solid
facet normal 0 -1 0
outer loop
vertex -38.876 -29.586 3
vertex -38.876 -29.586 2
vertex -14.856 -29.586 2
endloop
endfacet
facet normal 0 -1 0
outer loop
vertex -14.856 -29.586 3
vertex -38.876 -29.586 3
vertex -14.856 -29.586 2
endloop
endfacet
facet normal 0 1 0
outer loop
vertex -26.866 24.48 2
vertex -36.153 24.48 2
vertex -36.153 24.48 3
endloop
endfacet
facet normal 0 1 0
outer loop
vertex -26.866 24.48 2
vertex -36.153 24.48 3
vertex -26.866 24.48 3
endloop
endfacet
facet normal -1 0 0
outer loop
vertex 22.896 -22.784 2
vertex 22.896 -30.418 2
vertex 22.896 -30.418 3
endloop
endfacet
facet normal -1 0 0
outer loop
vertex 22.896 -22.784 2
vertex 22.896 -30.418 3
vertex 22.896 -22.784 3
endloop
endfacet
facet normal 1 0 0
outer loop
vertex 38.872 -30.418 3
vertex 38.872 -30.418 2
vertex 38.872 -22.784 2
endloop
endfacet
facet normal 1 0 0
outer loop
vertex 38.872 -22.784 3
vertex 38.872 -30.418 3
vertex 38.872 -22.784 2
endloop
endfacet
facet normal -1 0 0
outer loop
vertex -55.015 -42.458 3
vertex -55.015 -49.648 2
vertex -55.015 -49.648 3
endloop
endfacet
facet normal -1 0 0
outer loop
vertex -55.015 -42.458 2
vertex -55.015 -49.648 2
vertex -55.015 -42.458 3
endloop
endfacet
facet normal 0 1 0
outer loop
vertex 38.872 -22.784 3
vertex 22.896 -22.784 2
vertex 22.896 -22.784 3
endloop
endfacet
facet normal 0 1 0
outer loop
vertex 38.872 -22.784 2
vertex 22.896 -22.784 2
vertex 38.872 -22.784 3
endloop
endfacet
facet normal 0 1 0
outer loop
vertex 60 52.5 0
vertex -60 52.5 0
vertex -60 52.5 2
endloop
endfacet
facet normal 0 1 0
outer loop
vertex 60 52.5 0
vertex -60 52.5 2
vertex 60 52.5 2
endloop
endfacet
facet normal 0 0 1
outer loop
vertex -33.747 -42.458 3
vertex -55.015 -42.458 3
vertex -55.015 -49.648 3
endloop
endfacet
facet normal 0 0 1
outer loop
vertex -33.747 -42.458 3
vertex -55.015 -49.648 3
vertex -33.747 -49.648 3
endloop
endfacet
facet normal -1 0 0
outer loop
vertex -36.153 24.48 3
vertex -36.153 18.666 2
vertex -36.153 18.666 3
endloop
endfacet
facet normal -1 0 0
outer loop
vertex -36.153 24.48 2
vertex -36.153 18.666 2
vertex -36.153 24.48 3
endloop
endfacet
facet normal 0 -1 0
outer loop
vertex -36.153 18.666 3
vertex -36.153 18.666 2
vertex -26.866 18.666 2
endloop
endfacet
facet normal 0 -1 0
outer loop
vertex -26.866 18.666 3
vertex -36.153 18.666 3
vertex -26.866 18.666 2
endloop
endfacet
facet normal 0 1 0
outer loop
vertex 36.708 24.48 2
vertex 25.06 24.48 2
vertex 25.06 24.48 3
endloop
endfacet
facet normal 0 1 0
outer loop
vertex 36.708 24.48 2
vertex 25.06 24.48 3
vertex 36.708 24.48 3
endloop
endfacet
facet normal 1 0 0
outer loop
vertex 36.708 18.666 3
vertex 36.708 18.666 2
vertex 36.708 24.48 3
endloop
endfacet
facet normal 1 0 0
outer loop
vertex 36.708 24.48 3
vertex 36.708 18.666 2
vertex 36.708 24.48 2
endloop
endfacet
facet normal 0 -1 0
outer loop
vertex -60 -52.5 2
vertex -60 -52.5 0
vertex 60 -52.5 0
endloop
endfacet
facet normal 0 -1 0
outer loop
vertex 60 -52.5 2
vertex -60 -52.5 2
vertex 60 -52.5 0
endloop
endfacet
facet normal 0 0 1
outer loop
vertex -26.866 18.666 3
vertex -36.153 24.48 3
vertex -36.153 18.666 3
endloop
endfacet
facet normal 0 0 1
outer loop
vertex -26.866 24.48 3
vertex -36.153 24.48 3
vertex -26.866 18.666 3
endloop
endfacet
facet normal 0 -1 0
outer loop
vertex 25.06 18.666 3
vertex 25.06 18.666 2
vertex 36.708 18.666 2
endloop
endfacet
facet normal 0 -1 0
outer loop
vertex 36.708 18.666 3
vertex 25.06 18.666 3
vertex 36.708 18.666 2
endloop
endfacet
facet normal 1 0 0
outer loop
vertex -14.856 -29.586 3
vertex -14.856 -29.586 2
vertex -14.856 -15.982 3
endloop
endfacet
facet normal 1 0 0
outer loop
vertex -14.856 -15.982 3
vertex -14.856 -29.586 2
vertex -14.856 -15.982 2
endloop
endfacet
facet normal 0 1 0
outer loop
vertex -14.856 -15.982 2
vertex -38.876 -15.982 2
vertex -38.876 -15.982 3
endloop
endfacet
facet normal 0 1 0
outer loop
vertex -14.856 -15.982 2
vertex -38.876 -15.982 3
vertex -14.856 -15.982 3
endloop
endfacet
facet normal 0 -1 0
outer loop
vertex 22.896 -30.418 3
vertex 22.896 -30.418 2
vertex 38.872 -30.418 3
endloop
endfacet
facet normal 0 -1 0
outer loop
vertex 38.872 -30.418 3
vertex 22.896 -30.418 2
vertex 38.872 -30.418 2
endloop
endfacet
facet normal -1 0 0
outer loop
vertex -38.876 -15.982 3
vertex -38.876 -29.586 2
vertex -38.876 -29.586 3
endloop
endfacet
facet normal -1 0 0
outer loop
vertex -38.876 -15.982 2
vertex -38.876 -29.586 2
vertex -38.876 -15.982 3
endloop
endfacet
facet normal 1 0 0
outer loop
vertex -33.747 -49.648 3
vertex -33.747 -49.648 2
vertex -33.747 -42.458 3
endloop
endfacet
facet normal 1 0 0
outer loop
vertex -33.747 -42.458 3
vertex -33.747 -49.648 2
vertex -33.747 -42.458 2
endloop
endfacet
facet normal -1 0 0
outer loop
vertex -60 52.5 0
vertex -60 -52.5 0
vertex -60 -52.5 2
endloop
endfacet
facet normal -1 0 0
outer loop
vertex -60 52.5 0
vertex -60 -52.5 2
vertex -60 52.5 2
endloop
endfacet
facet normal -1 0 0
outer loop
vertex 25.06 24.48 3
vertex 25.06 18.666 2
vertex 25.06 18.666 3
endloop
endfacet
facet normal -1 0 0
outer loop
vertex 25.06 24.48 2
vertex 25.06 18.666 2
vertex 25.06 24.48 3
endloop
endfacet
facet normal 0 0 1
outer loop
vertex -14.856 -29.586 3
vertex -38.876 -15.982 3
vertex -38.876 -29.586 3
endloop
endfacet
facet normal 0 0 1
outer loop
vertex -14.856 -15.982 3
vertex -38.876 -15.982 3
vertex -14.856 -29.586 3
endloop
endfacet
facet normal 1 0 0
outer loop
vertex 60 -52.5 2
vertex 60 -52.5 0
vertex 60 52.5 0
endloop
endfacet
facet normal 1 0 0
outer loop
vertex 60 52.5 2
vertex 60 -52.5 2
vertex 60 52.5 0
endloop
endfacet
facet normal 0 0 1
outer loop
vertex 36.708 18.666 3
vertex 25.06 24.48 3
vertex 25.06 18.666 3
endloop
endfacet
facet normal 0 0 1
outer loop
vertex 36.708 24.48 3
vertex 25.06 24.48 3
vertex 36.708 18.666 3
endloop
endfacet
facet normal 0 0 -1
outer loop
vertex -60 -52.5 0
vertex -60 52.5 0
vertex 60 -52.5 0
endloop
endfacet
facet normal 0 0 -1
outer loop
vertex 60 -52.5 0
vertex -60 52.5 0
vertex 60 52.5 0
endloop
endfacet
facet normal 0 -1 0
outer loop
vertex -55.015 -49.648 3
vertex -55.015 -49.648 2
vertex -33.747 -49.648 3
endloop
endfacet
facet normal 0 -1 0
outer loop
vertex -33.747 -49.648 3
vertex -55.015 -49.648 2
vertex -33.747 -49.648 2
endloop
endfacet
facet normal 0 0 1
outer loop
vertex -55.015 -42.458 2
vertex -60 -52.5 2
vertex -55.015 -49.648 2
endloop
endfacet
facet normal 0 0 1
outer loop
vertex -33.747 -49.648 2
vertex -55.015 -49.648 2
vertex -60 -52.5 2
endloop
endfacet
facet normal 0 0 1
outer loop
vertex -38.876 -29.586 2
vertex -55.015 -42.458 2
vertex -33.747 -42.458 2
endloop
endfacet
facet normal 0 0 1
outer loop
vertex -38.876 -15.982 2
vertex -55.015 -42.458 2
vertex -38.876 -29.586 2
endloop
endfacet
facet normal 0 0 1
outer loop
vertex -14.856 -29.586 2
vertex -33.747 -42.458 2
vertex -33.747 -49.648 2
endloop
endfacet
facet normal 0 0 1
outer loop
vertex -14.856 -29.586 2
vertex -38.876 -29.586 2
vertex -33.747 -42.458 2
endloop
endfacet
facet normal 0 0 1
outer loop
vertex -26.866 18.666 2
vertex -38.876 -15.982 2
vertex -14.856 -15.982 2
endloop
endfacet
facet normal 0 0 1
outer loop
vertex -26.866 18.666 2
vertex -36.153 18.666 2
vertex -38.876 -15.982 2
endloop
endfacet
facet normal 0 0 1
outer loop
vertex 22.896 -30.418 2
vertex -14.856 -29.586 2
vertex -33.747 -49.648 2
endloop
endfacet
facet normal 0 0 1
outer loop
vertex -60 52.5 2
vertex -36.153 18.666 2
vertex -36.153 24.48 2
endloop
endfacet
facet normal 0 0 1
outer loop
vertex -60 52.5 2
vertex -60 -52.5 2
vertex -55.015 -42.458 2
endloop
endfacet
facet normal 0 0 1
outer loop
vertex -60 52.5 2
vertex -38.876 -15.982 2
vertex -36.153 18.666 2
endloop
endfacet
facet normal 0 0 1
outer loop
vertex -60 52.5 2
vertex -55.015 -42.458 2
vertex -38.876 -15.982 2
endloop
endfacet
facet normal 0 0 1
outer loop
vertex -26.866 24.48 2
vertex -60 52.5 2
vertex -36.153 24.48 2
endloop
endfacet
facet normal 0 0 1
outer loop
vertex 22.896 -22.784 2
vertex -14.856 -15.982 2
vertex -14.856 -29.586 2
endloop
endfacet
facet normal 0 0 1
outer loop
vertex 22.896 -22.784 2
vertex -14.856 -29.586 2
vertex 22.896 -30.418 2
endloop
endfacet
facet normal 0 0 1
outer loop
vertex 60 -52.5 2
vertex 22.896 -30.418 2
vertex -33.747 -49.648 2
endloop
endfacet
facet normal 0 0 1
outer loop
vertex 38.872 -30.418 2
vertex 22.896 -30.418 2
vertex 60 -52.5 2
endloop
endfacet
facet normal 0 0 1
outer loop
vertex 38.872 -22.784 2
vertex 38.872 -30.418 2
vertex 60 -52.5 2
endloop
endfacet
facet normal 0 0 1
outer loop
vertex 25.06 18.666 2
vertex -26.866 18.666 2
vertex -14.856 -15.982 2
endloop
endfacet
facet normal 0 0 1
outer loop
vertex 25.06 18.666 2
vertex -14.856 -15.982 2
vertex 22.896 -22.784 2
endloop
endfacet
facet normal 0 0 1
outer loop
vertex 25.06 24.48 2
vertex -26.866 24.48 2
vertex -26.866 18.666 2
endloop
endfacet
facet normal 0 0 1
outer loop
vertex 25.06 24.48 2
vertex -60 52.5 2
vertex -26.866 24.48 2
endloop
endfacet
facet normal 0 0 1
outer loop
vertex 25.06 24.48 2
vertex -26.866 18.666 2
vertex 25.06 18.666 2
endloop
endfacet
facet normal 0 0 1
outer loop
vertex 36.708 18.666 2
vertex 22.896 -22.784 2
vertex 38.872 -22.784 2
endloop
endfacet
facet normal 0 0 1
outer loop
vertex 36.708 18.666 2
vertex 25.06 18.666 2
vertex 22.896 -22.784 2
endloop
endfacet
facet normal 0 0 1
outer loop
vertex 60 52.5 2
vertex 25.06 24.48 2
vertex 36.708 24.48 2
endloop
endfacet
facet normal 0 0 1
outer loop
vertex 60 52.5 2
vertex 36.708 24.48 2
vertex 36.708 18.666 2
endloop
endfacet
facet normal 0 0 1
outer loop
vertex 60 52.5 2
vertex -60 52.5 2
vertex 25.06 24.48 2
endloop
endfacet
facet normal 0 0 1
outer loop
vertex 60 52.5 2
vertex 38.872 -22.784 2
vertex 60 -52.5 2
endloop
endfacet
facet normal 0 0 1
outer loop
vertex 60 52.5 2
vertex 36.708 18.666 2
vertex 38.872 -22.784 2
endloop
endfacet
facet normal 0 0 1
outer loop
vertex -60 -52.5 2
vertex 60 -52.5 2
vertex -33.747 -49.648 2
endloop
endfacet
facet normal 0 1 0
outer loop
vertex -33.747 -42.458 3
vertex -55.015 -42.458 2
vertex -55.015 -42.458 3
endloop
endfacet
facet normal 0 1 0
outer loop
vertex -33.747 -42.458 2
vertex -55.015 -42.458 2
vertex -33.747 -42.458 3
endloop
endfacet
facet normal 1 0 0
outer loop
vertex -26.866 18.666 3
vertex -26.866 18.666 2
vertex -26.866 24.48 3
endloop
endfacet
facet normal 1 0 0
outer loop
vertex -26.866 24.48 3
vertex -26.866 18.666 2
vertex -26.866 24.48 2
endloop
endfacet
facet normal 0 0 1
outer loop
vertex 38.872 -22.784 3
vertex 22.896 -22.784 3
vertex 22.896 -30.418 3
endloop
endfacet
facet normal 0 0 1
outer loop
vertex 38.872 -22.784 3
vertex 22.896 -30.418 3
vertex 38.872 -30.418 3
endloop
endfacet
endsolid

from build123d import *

# Parameters (mm, degrees)
SKETCH1_W           = 120
SKETCH1_H           = 105
BOSS_EXTRUDE1_DEPTH = 2
SKETCH2_W           = 24.020633768
SKETCH2_H           = 13.604733883
SKETCH2_W_2         = 15.976853837
SKETCH2_H_2         = 7.633913726
SKETCH2_W_3         = 9.287125415
SKETCH2_H_3         = 5.814380322
SKETCH2_W_4         = 11.648356386
SKETCH2_W_5         = 21.267599873
SKETCH2_H_4         = 7.189917071
BOSS_EXTRUDE2_DEPTH = 1


with BuildPart() as part:
    # Sketch1 → Boss-Extrude1 (new body)
    with BuildSketch(Plane.XY):
        Rectangle(SKETCH1_W, SKETCH1_H)
    extrude(amount=BOSS_EXTRUDE1_DEPTH)

    # Sketch2 → Boss-Extrude2 (add)
    with BuildSketch(Plane.XY.offset(2)):
        with Locations((-26.865959822, -22.784123417)):
            Rectangle(SKETCH2_W, SKETCH2_H)
        with Locations((30.883941206, -26.60108028)):
            Rectangle(SKETCH2_W_2, SKETCH2_H_2)
        with Locations((-31.509522529, 21.57302436)):
            Rectangle(SKETCH2_W_3, SKETCH2_H_3)
        with Locations((30.883941206, 21.57302436)):
            Rectangle(SKETCH2_W_4, SKETCH2_H_3)
        with Locations((-44.38112644, -46.052934011)):
            Rectangle(SKETCH2_W_5, SKETCH2_H_4)
    extrude(amount=BOSS_EXTRUDE2_DEPTH)


solid = part.part
